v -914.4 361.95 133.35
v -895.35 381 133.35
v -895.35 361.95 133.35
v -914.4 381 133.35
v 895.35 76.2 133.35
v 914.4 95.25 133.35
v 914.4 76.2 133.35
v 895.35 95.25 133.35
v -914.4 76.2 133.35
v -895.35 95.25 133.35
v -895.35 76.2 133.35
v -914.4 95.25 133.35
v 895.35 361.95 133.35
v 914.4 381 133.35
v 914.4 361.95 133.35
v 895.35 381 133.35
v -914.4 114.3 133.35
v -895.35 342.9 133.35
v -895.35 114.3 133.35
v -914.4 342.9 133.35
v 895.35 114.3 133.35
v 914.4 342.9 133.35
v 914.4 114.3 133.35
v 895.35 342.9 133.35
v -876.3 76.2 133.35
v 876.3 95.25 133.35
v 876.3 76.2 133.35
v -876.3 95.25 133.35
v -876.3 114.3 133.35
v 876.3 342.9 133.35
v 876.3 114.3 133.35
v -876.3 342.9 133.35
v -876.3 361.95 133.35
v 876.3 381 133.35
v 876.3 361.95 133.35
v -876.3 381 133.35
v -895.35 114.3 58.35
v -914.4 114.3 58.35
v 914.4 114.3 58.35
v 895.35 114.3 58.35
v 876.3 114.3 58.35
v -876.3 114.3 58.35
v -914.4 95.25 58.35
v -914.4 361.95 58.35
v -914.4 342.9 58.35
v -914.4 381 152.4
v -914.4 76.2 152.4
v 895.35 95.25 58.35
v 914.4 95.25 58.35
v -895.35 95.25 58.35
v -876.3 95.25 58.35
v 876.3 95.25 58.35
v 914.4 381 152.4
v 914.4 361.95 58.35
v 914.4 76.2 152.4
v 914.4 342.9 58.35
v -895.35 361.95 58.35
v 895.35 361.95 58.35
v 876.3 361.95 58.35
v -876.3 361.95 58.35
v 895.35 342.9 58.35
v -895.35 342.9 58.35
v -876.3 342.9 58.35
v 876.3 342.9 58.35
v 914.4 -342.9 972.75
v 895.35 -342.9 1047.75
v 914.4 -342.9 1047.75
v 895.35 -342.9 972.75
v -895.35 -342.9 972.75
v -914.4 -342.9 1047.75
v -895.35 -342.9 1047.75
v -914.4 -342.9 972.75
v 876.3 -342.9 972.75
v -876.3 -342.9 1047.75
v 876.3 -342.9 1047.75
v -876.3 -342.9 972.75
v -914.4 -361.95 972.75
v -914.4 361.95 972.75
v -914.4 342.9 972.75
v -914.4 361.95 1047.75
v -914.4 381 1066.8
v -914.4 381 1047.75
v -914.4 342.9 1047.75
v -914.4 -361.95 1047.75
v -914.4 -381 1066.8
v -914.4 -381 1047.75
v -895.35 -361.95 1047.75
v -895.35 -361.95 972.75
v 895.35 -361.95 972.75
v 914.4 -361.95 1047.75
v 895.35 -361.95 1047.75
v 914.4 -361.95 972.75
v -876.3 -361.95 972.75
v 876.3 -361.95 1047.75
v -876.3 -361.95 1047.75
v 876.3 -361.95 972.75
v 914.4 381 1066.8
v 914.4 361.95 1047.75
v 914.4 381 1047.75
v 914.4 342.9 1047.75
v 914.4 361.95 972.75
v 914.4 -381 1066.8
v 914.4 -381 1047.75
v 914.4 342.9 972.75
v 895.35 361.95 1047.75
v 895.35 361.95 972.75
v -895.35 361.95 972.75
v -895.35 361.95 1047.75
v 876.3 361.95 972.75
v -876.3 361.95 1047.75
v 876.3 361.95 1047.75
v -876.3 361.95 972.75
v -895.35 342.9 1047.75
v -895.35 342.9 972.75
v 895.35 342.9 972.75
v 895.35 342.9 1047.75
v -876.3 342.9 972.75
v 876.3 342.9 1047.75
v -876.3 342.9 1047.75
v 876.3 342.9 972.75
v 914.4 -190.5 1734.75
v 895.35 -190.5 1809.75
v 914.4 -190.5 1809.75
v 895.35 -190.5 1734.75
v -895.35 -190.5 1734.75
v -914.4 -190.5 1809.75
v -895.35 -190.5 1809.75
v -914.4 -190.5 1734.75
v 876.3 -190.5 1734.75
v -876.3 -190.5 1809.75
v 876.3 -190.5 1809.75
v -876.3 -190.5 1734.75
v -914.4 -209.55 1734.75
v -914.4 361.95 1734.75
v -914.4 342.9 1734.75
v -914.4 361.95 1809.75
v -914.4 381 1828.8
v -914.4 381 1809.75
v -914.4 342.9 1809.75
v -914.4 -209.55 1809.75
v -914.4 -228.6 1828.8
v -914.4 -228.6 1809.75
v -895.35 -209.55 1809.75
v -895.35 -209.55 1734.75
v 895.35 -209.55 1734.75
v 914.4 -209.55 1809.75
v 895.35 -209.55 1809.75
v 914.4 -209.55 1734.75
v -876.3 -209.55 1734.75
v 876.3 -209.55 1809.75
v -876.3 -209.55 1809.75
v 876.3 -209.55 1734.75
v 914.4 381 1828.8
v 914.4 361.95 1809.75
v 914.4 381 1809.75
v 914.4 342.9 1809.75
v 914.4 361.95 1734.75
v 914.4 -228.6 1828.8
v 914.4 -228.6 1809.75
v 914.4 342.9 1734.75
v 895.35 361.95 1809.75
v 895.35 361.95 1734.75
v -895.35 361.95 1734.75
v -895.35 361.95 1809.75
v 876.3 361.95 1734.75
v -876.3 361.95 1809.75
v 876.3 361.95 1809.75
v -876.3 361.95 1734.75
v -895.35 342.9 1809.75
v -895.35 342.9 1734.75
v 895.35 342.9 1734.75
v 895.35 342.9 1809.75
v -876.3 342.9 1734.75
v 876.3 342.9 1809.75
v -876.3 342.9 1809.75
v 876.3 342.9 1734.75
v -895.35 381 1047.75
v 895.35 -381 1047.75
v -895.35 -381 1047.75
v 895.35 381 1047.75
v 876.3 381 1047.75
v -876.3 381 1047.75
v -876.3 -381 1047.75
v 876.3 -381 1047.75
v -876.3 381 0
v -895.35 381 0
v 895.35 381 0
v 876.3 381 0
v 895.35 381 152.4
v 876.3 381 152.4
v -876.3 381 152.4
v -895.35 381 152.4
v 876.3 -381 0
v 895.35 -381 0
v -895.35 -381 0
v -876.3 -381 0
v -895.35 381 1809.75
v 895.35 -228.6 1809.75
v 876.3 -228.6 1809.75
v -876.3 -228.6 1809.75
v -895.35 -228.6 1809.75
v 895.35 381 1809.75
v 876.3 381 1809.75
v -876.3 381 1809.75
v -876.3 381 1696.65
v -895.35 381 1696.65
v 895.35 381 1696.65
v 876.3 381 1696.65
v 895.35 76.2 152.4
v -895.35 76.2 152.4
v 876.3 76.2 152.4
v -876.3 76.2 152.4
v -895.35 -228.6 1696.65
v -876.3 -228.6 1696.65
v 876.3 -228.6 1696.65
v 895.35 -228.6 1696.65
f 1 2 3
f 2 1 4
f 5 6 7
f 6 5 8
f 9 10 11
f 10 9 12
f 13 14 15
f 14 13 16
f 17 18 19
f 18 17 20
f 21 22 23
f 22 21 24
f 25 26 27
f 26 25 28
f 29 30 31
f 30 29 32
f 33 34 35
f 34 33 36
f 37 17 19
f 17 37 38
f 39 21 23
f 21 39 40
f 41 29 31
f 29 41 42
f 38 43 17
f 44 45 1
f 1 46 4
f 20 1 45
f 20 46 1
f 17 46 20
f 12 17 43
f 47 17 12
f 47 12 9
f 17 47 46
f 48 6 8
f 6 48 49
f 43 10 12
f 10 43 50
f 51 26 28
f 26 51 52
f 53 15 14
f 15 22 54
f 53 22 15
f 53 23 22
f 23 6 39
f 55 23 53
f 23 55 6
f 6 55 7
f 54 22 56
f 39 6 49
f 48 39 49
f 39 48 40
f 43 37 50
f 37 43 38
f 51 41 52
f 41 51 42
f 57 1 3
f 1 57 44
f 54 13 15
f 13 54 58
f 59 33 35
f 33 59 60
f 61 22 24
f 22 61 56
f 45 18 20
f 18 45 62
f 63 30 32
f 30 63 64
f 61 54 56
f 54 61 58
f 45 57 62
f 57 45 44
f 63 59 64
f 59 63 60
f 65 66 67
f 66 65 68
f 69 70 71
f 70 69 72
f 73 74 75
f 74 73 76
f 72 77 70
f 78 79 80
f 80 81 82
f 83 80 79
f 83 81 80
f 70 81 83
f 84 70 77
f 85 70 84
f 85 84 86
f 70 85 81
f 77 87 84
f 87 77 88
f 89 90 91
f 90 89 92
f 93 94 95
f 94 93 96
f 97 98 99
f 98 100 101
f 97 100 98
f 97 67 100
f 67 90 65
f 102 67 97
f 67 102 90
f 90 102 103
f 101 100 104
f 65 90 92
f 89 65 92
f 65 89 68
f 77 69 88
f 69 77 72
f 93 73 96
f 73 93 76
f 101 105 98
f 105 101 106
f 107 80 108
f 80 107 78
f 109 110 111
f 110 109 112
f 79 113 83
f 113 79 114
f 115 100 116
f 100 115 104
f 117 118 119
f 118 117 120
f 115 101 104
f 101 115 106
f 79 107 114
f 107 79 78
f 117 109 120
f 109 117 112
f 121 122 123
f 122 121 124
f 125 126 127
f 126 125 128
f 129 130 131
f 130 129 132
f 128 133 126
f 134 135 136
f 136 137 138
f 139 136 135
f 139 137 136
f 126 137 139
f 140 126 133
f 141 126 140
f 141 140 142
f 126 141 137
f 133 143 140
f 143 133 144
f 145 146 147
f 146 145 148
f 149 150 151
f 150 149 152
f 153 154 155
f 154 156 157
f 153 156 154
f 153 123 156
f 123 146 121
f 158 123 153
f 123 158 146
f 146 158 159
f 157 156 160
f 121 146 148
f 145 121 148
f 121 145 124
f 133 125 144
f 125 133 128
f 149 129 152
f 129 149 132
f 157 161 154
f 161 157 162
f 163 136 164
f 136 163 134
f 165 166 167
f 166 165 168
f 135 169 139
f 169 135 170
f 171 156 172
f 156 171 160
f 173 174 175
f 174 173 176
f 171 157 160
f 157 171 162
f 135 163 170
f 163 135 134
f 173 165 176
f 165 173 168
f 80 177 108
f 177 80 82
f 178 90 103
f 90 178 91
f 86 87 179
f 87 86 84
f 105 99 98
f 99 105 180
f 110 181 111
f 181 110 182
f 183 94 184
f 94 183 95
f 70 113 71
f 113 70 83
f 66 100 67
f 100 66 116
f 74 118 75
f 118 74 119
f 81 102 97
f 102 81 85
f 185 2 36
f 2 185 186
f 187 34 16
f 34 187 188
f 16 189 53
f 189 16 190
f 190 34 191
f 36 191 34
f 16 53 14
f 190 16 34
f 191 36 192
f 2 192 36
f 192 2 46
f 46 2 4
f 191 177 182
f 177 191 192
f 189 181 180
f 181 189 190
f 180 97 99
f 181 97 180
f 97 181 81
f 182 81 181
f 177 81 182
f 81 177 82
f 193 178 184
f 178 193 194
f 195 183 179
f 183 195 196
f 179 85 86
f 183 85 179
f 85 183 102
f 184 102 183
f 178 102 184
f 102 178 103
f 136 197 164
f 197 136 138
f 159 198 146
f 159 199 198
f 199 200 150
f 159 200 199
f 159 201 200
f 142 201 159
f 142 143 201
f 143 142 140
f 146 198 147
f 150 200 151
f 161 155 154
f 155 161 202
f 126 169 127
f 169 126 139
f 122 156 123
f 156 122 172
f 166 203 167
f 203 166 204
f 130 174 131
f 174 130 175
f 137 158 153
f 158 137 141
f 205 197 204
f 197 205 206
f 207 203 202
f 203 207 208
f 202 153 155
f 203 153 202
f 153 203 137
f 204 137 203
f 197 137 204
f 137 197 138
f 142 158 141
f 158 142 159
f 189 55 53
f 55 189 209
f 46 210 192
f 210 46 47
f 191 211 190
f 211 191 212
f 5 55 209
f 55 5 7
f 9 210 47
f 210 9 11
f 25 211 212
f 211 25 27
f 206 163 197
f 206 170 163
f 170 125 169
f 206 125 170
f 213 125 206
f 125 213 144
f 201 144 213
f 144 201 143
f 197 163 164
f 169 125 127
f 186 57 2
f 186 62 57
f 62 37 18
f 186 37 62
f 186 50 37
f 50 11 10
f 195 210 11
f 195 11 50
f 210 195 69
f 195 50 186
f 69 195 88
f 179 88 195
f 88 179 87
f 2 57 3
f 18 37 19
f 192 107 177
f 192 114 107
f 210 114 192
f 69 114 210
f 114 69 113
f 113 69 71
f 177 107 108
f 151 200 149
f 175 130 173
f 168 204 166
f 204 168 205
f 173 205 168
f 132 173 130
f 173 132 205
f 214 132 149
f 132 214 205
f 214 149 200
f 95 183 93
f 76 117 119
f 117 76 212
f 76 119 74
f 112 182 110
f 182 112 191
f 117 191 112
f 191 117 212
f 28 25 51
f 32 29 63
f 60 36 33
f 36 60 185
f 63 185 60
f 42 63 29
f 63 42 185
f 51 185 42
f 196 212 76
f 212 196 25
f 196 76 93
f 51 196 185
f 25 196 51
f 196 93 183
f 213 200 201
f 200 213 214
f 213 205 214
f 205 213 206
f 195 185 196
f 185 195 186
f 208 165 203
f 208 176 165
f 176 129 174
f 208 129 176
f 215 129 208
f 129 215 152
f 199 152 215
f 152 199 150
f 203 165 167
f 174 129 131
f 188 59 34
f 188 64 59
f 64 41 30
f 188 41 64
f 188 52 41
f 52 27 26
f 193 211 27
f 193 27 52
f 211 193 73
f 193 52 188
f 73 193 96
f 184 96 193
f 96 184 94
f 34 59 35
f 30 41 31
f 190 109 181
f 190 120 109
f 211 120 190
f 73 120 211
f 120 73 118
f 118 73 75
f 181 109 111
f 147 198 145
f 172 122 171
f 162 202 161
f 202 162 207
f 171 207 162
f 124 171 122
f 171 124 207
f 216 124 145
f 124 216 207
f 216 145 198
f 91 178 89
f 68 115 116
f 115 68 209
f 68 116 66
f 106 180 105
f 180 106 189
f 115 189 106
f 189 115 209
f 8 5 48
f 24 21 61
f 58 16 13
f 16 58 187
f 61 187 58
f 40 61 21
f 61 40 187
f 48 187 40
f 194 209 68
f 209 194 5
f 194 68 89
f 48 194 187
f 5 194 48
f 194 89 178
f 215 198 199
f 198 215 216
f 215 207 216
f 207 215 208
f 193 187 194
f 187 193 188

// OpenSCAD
// TODO:
// - sculpt the verticals
// - tab slots in surfaces
// - tabs on supports
// - drop supports down below surfaces
// - add cross supports in y axis (maybe just to main desk)
// - drop-in locks on cross supports and verticals
// - t-slots everywhere???
// - mock in the pegboard
// - add outlet box holes
// - bottom shelf needs to fit inside the legs

t = 3/4 * 25.4; // 3/4" plywood / mdf

function feet(ft) = ft * 12 * 25.4;

module _xy() {
  color([255/255, 64/255, 64/255]) linear_extrude(t, center=true) child(0);
}

module _yz() {
  color([64/255, 255/255, 64/255]) rotate([90, 0, 90]) linear_extrude(t, center=true) child(0);
}

module _xz() {
  color([64/255, 64/255, 255/255]) rotate([90, 0, 0]) linear_extrude(t, center=true) child(0);
}


main_desk_height = feet(3.5);
main_desk_depth = feet(2.5);
main_desk_width = feet(6);

top_shelf_height = feet(6);
top_shelf_depth = feet(2);
bottom_shelf_height = feet(0.5);
bottom_shelf_depth = feet(1);

overhang = t;
support_w = 75;
foot_w = 150;

module main_desktop() {
  square(size=[main_desk_width, main_desk_depth], center=true);
}

module top_shelf() {
  square(size=[main_desk_width, top_shelf_depth], center=true);
}

module bottom_shelf() {
  square(size=[main_desk_width, bottom_shelf_depth], center=true);
}

module _outer_leg() {
  // translate([0, top_shelf_height/2, 0]) 
//     square(size=[main_desk_depth, top_shelf_height], center=true);

  assign(surface_support_w = support_w + 2*t) 
  assign(bottom_leg_w = 400)
  assign(support_angle = 30)
  union() {
    // bottom "foot"
    // translate([0, foot_w/2, 0]) 
    //   square(size=[main_desk_depth, foot_w], center=true);

    // bottom leg
    translate([0, (main_desk_height - t)/2, 0]) 
    square(size=[main_desk_depth, main_desk_height - t], center=true);

    // desk support
    // translate([0, main_desk_height - surface_support_w / 2 - t, 0]) 
    //   square(size=[main_desk_depth, surface_support_w], center=true);
  
    // top shelf support
    translate([main_desk_depth/2 - top_shelf_depth/2, top_shelf_height - surface_support_w / 2 - t, 0]) 
      square(size=[top_shelf_depth, surface_support_w], center=true);
  }
}

module left_leg() {
  _outer_leg();
}

module right_leg() {
  scale([1, 1, -1]) _outer_leg();
}

module cross_support() {
  square(size=[main_desk_width, support_w], center=true);
}

module assembled() {
  translate([0, 0, main_desk_height - t/2]) _xy() main_desktop();
  translate([0, main_desk_depth / 2 - top_shelf_depth / 2, top_shelf_height - t/2]) 
    _xy() top_shelf();
  translate([0, main_desk_depth / 2 - bottom_shelf_depth / 2, bottom_shelf_height - t/2]) 
    _xy() bottom_shelf();
    
  translate([-main_desk_width/2 + t/2 + overhang, 0, 0]) 
    _yz() left_leg();
  translate([main_desk_width/2 - t/2 - overhang, 0, 0]) 
    _yz() right_leg();

  // cross supports for bottom shelf
  for (depth=[-1,1]) {
    translate([0, main_desk_depth / 2 - bottom_shelf_depth / 2 + depth * (bottom_shelf_depth/2 - overhang - t/2), bottom_shelf_height - support_w/2 - t]) 
      _xz() cross_support();
  }
  
  // cross supports for main desktop
  for (depth=[-1,1]) {
    translate([0, depth * (main_desk_depth/2 - overhang - t/2), main_desk_height - support_w/2 - t]) 
      _xz() cross_support();
  }
  
  // cross supports for top shelf
  for (depth=[-1,1]) {
    translate([0, main_desk_depth / 2 - top_shelf_depth / 2 + depth * (top_shelf_depth/2 - overhang - t/2), top_shelf_height - support_w/2 - t]) 
      _xz() cross_support();
  }
}

assembled();
